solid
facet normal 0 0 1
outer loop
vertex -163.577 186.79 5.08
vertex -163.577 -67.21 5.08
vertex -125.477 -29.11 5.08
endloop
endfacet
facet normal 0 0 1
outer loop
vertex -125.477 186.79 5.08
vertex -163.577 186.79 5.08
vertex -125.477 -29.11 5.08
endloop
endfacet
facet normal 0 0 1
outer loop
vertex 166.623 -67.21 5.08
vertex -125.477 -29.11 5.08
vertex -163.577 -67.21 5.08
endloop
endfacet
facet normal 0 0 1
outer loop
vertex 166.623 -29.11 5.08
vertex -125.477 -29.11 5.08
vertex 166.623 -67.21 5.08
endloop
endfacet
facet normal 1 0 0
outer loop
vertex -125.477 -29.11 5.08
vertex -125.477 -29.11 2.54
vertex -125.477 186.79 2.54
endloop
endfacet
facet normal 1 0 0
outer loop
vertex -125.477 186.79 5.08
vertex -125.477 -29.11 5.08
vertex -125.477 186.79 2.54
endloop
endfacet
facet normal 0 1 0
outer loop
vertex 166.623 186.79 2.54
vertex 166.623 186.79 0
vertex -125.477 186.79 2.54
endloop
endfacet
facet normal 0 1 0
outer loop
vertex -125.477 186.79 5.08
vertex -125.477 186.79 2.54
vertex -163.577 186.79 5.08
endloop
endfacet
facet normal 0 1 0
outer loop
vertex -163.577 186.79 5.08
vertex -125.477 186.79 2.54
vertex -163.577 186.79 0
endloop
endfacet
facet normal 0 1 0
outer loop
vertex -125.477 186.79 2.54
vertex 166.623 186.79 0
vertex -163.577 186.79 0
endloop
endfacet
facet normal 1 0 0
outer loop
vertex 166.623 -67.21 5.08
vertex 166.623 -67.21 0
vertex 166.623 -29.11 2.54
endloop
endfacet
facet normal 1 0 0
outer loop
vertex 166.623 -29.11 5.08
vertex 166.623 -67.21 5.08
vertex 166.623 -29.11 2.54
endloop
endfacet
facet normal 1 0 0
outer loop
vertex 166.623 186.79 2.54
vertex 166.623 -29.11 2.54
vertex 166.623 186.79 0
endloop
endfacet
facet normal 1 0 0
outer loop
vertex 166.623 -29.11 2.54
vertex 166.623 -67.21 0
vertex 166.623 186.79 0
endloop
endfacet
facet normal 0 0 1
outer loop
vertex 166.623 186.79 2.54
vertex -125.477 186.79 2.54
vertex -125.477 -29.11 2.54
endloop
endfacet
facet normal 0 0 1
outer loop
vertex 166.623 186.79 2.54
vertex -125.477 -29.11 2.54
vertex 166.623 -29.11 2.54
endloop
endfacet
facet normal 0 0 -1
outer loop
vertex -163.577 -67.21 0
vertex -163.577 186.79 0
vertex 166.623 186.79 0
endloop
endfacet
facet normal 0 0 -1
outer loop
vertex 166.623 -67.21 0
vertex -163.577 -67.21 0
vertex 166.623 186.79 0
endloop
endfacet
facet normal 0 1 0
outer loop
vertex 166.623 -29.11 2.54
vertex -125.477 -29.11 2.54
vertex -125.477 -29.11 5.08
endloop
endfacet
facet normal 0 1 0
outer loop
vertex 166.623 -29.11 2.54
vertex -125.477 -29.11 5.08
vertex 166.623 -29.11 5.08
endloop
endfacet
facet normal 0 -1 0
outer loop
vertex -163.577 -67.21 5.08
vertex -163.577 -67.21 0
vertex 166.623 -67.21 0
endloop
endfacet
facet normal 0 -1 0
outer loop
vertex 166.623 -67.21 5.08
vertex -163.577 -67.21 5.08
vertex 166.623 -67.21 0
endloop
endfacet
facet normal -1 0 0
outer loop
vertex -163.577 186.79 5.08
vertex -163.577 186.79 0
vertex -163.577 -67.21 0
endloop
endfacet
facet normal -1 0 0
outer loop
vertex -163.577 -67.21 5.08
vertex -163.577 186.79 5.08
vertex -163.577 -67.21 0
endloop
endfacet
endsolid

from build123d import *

# Parameters (mm, degrees)
F0_W     = 292.1
F0_H     = 215.9
F0_W_2   = 38.1
F1_DEPTH = 2.54
F2_W     = 292.1
F2_H     = 38.1
F3_DEPTH = 2.54


with BuildPart() as f1:
    # F0 (on Top) → F1 (new body)
    with BuildSketch(Plane.XY):
        with Locations((20.573033, 78.840188)):
            Rectangle(F0_W, F0_H)
        with Locations((-144.526967, 78.840188)):
            Rectangle(F0_W_2, F0_H)
        Polygon((-125.476967, -29.109812), (-163.576967, -29.109812), (-163.576967, -67.209812), (166.623033, -67.209812), (166.623033, -29.109812), align=None)
    extrude(amount=F1_DEPTH)

    # F2 (on face) → F3 (join)
    with BuildSketch(Plane.XY.offset(2.54)):
        with Locations((20.573033, -48.159812)):
            Rectangle(F2_W, F2_H)
        Polygon((-125.476967, 186.790188), (-163.576967, 186.790188), (-163.576967, -67.209812), (-125.476967, -67.209812), (-125.476967, -29.109812), align=None)
    extrude(amount=F3_DEPTH)


solid = f1.part
